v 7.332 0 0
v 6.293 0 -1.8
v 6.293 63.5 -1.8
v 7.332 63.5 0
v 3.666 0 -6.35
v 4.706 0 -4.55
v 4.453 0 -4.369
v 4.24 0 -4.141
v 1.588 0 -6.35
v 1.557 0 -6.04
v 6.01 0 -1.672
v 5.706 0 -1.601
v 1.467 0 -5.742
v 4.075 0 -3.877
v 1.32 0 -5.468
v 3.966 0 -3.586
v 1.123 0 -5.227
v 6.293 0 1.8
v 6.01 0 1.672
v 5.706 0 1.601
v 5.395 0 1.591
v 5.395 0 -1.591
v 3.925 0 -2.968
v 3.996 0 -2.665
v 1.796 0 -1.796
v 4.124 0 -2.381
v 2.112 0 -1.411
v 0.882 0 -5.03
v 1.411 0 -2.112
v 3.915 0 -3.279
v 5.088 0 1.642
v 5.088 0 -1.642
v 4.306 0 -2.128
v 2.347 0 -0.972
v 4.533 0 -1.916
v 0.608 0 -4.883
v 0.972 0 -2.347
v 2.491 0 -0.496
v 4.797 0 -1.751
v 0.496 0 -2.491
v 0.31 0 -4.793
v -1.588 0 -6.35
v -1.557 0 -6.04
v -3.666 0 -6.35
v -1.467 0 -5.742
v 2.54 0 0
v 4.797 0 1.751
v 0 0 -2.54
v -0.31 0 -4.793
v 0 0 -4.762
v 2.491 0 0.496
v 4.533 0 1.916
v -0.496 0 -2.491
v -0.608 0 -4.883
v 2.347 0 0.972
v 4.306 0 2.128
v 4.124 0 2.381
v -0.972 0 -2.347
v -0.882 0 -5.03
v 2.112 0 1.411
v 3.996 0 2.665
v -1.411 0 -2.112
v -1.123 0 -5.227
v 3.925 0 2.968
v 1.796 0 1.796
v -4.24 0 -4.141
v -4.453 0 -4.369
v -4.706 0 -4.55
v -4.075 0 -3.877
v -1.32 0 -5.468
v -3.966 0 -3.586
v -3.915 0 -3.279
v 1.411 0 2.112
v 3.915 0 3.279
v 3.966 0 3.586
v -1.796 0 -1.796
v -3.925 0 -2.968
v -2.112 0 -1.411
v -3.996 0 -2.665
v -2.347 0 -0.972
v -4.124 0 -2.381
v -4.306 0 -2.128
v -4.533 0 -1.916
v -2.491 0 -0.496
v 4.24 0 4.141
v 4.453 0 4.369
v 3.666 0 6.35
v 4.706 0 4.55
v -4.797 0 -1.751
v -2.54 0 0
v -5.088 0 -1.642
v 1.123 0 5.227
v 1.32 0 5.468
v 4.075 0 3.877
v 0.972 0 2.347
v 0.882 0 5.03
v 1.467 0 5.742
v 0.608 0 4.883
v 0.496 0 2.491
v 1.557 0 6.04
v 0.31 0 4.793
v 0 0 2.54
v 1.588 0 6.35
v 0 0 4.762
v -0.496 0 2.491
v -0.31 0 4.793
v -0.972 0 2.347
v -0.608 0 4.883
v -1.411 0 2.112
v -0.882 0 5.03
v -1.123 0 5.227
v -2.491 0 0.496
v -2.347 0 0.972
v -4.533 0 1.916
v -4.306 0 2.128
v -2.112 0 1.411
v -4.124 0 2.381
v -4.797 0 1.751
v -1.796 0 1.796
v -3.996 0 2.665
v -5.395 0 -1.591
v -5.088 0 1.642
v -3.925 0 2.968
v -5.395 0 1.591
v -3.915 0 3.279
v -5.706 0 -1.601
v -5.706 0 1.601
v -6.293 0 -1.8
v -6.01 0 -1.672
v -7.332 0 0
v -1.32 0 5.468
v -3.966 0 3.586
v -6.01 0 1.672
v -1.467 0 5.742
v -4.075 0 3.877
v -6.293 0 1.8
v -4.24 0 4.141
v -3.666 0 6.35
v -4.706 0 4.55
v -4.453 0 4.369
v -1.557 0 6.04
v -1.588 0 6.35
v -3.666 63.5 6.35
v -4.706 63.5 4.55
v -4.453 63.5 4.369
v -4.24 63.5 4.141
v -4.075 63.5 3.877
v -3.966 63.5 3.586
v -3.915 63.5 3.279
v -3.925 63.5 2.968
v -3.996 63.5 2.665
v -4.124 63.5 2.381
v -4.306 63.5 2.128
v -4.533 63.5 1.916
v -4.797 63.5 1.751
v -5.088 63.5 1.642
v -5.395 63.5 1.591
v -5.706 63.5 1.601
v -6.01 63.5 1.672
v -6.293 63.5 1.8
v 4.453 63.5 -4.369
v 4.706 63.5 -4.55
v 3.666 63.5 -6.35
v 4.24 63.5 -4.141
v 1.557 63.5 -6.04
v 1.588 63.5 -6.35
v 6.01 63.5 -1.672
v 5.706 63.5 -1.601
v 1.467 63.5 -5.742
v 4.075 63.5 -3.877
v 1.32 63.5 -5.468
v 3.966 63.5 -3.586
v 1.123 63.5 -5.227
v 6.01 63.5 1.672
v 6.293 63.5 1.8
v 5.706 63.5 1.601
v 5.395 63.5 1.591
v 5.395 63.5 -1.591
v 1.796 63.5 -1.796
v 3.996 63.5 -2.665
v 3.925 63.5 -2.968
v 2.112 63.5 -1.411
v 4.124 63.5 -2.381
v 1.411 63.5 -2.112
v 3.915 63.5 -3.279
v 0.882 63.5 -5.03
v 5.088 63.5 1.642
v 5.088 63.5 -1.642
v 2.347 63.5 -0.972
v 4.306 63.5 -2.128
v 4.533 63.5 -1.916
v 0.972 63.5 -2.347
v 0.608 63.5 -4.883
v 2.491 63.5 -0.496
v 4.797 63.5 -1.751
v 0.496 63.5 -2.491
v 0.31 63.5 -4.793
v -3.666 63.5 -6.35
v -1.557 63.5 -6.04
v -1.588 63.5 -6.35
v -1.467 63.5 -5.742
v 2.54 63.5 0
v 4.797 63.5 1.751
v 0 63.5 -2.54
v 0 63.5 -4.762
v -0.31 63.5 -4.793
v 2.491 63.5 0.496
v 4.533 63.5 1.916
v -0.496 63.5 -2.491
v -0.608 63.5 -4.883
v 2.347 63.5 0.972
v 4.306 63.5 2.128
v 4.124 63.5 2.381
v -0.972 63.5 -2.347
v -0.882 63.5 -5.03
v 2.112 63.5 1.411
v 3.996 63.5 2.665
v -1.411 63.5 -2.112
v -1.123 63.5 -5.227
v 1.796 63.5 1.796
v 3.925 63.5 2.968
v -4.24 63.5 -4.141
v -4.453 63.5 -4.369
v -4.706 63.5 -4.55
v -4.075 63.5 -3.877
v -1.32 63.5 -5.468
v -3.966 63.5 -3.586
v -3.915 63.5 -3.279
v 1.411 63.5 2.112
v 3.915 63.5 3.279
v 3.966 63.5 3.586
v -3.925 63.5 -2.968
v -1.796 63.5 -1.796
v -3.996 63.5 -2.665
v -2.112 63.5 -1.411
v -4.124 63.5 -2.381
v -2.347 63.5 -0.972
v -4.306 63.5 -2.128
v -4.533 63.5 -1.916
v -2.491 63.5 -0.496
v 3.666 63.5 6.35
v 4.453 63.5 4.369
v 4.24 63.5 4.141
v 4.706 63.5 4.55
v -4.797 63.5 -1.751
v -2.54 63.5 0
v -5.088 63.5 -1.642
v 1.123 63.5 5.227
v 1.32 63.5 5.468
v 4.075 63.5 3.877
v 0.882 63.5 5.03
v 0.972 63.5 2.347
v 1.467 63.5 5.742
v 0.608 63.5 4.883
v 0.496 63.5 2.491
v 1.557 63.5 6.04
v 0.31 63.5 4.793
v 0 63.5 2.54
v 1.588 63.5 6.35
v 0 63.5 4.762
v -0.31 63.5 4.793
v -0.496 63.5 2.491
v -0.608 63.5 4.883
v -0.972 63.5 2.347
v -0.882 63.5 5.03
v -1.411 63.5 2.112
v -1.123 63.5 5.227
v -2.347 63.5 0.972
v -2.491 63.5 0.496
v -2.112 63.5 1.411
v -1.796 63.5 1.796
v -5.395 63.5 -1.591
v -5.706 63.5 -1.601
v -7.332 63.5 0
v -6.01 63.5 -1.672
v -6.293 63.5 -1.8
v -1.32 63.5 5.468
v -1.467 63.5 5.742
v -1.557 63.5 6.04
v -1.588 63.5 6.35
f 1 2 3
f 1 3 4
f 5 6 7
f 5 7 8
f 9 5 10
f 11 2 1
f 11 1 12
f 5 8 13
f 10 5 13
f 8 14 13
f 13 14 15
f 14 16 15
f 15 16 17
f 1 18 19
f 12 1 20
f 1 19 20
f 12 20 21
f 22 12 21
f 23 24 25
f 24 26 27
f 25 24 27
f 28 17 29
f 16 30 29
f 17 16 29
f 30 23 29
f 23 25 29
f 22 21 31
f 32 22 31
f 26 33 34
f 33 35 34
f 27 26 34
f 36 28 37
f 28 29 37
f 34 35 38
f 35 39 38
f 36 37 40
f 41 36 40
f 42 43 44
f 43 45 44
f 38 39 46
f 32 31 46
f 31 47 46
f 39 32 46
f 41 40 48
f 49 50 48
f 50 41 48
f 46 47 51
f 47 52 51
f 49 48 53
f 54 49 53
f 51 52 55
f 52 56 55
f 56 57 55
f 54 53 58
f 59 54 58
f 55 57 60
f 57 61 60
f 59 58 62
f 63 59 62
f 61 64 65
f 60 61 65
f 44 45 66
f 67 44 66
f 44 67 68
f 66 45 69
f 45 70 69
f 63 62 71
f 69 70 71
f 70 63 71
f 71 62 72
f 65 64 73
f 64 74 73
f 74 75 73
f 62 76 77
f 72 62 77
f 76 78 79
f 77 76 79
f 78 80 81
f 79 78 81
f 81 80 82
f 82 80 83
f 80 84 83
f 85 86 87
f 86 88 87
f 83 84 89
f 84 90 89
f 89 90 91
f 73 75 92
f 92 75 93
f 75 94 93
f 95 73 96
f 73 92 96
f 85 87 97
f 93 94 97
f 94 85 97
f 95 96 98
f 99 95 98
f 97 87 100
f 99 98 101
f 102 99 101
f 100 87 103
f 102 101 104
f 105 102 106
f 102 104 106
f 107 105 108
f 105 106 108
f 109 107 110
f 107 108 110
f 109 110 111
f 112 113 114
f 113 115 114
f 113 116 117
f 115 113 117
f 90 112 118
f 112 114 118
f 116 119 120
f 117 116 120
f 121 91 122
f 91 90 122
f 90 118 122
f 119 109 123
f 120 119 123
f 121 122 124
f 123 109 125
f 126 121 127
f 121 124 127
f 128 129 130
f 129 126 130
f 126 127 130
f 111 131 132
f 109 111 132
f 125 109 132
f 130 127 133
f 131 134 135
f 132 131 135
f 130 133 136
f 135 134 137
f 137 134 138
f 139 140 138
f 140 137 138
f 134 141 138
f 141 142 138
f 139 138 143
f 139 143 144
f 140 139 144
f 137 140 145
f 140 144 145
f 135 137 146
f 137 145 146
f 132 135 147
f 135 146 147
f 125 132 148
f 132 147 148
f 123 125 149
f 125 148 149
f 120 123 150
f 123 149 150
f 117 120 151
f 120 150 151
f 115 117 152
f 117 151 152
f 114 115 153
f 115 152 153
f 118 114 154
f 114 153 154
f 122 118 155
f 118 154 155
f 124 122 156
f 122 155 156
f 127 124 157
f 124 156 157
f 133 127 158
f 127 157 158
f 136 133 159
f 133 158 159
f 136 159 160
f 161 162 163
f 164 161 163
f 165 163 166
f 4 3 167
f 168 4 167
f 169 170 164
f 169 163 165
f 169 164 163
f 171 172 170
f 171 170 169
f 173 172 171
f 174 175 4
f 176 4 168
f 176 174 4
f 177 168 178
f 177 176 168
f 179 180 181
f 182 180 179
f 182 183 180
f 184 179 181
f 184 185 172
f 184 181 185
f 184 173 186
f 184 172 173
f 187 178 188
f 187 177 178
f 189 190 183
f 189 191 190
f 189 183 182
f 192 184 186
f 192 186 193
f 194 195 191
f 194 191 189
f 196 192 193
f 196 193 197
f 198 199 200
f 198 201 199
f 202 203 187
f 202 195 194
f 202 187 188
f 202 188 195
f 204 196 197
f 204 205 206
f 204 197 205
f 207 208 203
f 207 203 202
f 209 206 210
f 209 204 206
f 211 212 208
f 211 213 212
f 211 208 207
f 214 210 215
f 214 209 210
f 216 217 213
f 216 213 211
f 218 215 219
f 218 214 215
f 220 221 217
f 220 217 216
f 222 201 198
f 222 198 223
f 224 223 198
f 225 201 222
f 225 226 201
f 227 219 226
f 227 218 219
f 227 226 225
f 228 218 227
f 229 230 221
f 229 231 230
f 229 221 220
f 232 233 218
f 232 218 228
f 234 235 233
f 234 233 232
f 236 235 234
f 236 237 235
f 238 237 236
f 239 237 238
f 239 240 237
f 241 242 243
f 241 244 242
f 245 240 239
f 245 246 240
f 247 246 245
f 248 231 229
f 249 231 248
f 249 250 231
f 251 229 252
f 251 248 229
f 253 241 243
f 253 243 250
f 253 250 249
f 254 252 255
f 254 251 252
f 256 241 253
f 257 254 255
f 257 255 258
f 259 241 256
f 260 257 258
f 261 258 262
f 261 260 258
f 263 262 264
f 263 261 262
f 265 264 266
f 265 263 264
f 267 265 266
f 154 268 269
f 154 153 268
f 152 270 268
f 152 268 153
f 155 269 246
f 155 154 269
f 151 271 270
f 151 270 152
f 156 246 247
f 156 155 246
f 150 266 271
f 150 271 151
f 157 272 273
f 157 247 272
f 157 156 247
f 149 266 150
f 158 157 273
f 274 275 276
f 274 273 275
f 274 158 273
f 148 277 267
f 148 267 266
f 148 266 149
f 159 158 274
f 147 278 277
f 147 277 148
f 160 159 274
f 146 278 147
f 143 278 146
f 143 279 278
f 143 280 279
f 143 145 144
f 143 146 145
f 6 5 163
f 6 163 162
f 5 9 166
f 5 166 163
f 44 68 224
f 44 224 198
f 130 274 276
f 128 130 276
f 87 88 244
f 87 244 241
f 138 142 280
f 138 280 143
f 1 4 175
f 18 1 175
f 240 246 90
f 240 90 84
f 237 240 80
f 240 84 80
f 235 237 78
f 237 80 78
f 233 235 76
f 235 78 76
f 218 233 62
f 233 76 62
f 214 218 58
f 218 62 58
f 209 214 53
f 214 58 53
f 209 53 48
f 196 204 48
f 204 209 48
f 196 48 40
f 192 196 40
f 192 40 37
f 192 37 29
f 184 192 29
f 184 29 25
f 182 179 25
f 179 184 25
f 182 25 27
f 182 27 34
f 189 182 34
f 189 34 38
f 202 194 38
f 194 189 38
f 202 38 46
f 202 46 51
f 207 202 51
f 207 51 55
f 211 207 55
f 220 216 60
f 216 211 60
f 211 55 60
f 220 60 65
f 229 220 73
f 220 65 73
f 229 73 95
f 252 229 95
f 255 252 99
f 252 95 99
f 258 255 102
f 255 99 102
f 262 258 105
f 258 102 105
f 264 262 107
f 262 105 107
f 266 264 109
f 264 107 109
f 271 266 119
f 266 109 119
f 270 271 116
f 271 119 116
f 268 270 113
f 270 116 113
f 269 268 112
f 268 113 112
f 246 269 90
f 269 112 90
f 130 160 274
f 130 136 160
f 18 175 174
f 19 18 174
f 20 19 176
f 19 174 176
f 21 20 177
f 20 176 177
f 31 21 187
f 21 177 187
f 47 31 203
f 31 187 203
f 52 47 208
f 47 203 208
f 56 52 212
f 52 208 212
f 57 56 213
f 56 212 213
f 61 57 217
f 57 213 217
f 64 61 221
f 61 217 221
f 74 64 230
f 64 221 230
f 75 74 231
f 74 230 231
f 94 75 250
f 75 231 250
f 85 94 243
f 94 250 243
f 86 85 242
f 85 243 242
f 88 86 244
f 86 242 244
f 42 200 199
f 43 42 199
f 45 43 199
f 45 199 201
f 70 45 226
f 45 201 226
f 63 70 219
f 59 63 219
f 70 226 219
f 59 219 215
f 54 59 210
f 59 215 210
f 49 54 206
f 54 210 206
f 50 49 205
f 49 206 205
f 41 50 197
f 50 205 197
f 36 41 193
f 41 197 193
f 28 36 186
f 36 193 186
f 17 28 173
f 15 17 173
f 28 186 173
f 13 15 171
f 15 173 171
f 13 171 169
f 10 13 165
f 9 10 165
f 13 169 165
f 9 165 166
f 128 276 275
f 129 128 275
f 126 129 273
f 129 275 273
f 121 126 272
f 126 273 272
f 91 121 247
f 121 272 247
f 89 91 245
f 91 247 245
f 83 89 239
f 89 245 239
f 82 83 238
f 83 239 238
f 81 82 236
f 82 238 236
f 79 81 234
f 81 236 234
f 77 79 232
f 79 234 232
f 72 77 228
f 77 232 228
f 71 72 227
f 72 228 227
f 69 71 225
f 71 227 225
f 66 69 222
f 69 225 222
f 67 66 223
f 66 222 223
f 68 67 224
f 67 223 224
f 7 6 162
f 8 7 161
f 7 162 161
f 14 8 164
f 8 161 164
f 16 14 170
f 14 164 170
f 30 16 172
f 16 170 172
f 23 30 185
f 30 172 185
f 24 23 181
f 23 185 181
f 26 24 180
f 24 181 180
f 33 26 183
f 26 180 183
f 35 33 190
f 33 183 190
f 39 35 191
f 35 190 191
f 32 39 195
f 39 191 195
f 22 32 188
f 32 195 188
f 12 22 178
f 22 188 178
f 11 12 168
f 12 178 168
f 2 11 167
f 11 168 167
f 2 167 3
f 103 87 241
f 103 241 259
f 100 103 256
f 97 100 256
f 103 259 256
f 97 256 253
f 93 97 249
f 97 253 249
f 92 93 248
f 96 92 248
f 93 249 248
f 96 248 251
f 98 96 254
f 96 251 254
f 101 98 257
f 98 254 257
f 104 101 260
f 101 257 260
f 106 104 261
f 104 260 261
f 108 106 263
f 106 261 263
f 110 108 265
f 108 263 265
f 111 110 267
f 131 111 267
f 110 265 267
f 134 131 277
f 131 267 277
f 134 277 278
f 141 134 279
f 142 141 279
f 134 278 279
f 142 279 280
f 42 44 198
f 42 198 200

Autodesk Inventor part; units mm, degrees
ref_plane "YZ Plane" through (0, 0, 0) normal (1, 0, 0) x (0, 1, 0)
ref_plane "XZ Plane" through (0, 0, 0) normal (0, 1, 0) x (-1, 0, 0)
ref_plane "XY Plane" through (0, 0, 0) normal (0, 0, 1) x (1, 0, 0)
sketch "Sketch1" plane through (0, 0, 0) normal (0, 1, 0) x (-1, 0, 0)
  line L0 (-3.6662, 6.35) -> (3.6662, 6.35)
  line L1 (3.6662, 6.35) -> (7.3323, 0)
  line L2 (7.3323, 0) -> (3.6662, -6.35)
  line L3 (3.6662, -6.35) -> (-3.6662, -6.35)
  line L4 (-3.6662, -6.35) -> (-7.3323, 0)
  line L5 (-7.3323, 0) -> (-3.6662, 6.35)
  circle A0 centre (0, 0) radius 2.54
  dimension "d0" = 12.7
  dimension "d1" = 5.08
extrude "Extrusion1" add sketch "Sketch1" along normal blind 63.5
sketch "Sketch2" plane through (0, 63.5, 0) normal (0, 1, 0) x (1, 0, 0)
  line L0 (-3.6662, 6.35) -> (3.6662, 6.35) projected
  arc A0 (-1.5875, 6.35) -> (1.5875, 6.35) centre (0, 6.35) ccw
  line L1 (-1.5875, 6.35) -> (1.5875, 6.35)
  dimension "d4" = 1.5875
extrude "Extrusion2" cut sketch "Sketch2" against normal through all
pattern_circular "Circular Pattern1" count 6 over 360 about axis through (0, 0, 0) along (0, 1, 0) of "Extrusion2"
properties part number "UpperPlateStandoff" material "Aluminum-6061"
